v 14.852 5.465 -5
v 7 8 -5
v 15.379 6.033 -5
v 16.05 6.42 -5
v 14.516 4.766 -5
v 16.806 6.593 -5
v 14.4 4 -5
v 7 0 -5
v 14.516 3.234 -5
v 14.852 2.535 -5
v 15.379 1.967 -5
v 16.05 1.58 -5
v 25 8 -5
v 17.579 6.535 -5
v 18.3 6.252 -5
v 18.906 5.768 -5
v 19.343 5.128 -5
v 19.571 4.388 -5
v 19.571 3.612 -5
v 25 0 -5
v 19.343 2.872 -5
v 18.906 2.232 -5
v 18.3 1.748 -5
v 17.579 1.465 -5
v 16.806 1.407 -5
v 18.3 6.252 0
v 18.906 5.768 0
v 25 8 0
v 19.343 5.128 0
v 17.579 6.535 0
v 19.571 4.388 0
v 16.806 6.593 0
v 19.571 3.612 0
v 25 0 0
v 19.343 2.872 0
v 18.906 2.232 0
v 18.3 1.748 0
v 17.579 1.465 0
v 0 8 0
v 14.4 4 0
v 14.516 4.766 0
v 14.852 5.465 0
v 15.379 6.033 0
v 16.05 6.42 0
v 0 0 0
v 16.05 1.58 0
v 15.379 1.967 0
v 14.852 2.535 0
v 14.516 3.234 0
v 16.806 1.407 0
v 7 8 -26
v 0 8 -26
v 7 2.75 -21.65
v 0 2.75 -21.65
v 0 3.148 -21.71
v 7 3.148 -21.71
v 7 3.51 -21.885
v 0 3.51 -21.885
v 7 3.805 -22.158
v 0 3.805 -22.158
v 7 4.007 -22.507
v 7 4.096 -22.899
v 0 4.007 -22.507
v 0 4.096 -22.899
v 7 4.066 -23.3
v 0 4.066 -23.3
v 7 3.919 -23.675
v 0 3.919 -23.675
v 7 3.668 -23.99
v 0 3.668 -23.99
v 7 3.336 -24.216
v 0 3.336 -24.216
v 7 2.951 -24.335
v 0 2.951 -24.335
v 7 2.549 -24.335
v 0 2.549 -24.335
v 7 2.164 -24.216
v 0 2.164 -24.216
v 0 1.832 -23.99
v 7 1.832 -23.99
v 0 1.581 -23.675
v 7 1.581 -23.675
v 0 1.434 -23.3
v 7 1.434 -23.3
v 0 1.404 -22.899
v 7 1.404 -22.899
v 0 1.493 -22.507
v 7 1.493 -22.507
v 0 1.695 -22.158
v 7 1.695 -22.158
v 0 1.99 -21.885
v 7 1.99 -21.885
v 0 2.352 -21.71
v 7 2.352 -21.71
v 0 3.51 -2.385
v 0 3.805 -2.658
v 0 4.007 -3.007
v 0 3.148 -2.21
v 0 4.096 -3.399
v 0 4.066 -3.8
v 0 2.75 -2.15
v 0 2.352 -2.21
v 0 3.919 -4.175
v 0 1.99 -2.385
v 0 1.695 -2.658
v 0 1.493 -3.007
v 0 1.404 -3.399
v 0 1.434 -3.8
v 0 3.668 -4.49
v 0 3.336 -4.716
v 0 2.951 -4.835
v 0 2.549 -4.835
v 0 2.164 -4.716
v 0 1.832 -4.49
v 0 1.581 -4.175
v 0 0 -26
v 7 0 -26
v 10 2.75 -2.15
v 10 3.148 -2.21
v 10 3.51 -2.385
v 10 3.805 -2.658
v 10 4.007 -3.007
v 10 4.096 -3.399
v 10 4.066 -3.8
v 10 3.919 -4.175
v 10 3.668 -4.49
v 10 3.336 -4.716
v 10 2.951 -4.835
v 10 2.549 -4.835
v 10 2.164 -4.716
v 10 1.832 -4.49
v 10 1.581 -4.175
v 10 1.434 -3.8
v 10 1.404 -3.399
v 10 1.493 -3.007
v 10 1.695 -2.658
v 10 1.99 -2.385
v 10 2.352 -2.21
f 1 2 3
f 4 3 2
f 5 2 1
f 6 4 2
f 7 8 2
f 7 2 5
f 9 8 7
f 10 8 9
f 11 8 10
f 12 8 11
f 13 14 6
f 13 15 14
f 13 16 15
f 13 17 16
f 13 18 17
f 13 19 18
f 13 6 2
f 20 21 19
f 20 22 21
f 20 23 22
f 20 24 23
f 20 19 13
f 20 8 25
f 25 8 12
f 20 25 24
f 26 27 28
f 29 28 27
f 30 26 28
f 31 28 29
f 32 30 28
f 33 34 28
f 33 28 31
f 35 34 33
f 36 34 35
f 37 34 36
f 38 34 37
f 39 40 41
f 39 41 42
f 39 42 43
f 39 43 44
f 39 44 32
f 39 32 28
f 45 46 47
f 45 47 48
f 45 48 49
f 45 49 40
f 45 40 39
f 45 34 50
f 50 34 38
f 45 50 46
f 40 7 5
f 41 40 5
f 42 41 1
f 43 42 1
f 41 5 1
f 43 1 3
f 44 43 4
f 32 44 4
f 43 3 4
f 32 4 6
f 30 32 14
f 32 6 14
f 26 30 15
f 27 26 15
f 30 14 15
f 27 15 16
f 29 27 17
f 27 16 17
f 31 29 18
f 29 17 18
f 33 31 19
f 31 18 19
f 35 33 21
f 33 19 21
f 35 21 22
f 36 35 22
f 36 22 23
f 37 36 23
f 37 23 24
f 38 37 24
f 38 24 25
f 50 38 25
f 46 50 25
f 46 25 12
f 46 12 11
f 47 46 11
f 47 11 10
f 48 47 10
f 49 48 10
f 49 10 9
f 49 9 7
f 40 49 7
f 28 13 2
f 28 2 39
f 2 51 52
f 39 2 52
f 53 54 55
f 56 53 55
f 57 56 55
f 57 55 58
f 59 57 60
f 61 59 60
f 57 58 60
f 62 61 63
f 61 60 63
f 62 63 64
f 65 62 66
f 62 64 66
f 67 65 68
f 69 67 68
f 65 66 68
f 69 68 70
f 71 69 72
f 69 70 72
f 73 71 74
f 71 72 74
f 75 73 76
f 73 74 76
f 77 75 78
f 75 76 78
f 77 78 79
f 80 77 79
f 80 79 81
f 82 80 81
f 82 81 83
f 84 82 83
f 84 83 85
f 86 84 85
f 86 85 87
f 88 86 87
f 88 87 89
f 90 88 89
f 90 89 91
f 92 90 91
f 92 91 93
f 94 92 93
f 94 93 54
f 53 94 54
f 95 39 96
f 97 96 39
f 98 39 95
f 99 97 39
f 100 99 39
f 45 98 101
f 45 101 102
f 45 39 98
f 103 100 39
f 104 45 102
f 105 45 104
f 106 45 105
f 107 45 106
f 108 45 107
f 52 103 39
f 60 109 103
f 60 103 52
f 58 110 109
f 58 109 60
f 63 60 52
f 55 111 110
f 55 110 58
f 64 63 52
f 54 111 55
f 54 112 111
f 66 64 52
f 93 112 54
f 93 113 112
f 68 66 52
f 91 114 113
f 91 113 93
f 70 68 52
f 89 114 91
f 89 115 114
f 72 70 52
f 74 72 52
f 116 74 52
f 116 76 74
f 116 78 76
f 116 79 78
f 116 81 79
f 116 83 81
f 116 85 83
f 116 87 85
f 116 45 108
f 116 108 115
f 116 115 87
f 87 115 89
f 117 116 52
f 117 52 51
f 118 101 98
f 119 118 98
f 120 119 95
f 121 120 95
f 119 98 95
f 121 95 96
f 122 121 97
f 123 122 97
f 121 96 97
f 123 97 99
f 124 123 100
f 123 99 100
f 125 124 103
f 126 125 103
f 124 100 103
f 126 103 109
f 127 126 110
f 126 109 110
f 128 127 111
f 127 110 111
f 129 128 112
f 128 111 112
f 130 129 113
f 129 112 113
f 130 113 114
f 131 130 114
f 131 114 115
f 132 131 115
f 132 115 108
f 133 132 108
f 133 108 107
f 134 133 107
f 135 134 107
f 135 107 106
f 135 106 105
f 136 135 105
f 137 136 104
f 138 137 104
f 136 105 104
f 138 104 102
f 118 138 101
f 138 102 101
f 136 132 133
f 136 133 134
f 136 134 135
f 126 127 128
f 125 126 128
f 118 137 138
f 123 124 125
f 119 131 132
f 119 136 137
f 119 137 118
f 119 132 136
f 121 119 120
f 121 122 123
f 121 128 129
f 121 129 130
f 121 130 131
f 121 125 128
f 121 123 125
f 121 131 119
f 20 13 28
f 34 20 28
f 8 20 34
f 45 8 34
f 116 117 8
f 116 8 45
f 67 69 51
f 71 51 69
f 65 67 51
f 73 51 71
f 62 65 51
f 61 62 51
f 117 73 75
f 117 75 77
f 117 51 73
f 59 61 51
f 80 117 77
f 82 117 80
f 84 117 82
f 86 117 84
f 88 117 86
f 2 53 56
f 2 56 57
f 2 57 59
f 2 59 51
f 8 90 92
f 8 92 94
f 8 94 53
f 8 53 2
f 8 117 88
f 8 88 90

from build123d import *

# Parameters (mm, degrees)
BOSS_EXTRUDE1_DEPTH = 8
SKETCH2_R           = 1.35
CUT_EXTRUDE1_DEPTH  = 10
CUT_EXTRUDE2_REACH  = 7
SKETCH4_R           = 2.6


with BuildPart() as part:
    # Sketch1 → Boss-Extrude1 (new body)
    with BuildSketch(Plane(origin=(0, 0, 0), x_dir=(1, 0, 0), z_dir=(0, 1, 0))):
        Polygon((0, 0), (0, 26), (7, 26), (7, 5), (25, 5), (25, 0), align=None)
    extrude(amount=BOSS_EXTRUDE1_DEPTH)

    # Sketch2 → Cut-Extrude1 (cut)
    with BuildSketch(Plane.ZY):
        with Locations((-23, 2.75)):
            Circle(SKETCH2_R)
        with Locations((-3.5, 2.75)):
            Circle(SKETCH2_R)
    extrude(amount=-CUT_EXTRUDE1_DEPTH, mode=Mode.SUBTRACT)

    # Sketch4 → Cut-Extrude2 (cut, up to next)
    with BuildSketch(Plane(origin=(0, 0, -5), x_dir=(-1, 0, 0), z_dir=(0, 0, -1)), mode=Mode.PRIVATE) as cut_extrude2_sk1:
        with Locations((-17, 4)):
            Circle(SKETCH4_R)
    cut_extrude2_tool1 = extrude(cut_extrude2_sk1.sketch, amount=-CUT_EXTRUDE2_REACH, mode=Mode.PRIVATE) & part.part
    add(cut_extrude2_tool1.solids().sort_by_distance((17, 4, -5))[0], mode=Mode.SUBTRACT)


solid = part.part
